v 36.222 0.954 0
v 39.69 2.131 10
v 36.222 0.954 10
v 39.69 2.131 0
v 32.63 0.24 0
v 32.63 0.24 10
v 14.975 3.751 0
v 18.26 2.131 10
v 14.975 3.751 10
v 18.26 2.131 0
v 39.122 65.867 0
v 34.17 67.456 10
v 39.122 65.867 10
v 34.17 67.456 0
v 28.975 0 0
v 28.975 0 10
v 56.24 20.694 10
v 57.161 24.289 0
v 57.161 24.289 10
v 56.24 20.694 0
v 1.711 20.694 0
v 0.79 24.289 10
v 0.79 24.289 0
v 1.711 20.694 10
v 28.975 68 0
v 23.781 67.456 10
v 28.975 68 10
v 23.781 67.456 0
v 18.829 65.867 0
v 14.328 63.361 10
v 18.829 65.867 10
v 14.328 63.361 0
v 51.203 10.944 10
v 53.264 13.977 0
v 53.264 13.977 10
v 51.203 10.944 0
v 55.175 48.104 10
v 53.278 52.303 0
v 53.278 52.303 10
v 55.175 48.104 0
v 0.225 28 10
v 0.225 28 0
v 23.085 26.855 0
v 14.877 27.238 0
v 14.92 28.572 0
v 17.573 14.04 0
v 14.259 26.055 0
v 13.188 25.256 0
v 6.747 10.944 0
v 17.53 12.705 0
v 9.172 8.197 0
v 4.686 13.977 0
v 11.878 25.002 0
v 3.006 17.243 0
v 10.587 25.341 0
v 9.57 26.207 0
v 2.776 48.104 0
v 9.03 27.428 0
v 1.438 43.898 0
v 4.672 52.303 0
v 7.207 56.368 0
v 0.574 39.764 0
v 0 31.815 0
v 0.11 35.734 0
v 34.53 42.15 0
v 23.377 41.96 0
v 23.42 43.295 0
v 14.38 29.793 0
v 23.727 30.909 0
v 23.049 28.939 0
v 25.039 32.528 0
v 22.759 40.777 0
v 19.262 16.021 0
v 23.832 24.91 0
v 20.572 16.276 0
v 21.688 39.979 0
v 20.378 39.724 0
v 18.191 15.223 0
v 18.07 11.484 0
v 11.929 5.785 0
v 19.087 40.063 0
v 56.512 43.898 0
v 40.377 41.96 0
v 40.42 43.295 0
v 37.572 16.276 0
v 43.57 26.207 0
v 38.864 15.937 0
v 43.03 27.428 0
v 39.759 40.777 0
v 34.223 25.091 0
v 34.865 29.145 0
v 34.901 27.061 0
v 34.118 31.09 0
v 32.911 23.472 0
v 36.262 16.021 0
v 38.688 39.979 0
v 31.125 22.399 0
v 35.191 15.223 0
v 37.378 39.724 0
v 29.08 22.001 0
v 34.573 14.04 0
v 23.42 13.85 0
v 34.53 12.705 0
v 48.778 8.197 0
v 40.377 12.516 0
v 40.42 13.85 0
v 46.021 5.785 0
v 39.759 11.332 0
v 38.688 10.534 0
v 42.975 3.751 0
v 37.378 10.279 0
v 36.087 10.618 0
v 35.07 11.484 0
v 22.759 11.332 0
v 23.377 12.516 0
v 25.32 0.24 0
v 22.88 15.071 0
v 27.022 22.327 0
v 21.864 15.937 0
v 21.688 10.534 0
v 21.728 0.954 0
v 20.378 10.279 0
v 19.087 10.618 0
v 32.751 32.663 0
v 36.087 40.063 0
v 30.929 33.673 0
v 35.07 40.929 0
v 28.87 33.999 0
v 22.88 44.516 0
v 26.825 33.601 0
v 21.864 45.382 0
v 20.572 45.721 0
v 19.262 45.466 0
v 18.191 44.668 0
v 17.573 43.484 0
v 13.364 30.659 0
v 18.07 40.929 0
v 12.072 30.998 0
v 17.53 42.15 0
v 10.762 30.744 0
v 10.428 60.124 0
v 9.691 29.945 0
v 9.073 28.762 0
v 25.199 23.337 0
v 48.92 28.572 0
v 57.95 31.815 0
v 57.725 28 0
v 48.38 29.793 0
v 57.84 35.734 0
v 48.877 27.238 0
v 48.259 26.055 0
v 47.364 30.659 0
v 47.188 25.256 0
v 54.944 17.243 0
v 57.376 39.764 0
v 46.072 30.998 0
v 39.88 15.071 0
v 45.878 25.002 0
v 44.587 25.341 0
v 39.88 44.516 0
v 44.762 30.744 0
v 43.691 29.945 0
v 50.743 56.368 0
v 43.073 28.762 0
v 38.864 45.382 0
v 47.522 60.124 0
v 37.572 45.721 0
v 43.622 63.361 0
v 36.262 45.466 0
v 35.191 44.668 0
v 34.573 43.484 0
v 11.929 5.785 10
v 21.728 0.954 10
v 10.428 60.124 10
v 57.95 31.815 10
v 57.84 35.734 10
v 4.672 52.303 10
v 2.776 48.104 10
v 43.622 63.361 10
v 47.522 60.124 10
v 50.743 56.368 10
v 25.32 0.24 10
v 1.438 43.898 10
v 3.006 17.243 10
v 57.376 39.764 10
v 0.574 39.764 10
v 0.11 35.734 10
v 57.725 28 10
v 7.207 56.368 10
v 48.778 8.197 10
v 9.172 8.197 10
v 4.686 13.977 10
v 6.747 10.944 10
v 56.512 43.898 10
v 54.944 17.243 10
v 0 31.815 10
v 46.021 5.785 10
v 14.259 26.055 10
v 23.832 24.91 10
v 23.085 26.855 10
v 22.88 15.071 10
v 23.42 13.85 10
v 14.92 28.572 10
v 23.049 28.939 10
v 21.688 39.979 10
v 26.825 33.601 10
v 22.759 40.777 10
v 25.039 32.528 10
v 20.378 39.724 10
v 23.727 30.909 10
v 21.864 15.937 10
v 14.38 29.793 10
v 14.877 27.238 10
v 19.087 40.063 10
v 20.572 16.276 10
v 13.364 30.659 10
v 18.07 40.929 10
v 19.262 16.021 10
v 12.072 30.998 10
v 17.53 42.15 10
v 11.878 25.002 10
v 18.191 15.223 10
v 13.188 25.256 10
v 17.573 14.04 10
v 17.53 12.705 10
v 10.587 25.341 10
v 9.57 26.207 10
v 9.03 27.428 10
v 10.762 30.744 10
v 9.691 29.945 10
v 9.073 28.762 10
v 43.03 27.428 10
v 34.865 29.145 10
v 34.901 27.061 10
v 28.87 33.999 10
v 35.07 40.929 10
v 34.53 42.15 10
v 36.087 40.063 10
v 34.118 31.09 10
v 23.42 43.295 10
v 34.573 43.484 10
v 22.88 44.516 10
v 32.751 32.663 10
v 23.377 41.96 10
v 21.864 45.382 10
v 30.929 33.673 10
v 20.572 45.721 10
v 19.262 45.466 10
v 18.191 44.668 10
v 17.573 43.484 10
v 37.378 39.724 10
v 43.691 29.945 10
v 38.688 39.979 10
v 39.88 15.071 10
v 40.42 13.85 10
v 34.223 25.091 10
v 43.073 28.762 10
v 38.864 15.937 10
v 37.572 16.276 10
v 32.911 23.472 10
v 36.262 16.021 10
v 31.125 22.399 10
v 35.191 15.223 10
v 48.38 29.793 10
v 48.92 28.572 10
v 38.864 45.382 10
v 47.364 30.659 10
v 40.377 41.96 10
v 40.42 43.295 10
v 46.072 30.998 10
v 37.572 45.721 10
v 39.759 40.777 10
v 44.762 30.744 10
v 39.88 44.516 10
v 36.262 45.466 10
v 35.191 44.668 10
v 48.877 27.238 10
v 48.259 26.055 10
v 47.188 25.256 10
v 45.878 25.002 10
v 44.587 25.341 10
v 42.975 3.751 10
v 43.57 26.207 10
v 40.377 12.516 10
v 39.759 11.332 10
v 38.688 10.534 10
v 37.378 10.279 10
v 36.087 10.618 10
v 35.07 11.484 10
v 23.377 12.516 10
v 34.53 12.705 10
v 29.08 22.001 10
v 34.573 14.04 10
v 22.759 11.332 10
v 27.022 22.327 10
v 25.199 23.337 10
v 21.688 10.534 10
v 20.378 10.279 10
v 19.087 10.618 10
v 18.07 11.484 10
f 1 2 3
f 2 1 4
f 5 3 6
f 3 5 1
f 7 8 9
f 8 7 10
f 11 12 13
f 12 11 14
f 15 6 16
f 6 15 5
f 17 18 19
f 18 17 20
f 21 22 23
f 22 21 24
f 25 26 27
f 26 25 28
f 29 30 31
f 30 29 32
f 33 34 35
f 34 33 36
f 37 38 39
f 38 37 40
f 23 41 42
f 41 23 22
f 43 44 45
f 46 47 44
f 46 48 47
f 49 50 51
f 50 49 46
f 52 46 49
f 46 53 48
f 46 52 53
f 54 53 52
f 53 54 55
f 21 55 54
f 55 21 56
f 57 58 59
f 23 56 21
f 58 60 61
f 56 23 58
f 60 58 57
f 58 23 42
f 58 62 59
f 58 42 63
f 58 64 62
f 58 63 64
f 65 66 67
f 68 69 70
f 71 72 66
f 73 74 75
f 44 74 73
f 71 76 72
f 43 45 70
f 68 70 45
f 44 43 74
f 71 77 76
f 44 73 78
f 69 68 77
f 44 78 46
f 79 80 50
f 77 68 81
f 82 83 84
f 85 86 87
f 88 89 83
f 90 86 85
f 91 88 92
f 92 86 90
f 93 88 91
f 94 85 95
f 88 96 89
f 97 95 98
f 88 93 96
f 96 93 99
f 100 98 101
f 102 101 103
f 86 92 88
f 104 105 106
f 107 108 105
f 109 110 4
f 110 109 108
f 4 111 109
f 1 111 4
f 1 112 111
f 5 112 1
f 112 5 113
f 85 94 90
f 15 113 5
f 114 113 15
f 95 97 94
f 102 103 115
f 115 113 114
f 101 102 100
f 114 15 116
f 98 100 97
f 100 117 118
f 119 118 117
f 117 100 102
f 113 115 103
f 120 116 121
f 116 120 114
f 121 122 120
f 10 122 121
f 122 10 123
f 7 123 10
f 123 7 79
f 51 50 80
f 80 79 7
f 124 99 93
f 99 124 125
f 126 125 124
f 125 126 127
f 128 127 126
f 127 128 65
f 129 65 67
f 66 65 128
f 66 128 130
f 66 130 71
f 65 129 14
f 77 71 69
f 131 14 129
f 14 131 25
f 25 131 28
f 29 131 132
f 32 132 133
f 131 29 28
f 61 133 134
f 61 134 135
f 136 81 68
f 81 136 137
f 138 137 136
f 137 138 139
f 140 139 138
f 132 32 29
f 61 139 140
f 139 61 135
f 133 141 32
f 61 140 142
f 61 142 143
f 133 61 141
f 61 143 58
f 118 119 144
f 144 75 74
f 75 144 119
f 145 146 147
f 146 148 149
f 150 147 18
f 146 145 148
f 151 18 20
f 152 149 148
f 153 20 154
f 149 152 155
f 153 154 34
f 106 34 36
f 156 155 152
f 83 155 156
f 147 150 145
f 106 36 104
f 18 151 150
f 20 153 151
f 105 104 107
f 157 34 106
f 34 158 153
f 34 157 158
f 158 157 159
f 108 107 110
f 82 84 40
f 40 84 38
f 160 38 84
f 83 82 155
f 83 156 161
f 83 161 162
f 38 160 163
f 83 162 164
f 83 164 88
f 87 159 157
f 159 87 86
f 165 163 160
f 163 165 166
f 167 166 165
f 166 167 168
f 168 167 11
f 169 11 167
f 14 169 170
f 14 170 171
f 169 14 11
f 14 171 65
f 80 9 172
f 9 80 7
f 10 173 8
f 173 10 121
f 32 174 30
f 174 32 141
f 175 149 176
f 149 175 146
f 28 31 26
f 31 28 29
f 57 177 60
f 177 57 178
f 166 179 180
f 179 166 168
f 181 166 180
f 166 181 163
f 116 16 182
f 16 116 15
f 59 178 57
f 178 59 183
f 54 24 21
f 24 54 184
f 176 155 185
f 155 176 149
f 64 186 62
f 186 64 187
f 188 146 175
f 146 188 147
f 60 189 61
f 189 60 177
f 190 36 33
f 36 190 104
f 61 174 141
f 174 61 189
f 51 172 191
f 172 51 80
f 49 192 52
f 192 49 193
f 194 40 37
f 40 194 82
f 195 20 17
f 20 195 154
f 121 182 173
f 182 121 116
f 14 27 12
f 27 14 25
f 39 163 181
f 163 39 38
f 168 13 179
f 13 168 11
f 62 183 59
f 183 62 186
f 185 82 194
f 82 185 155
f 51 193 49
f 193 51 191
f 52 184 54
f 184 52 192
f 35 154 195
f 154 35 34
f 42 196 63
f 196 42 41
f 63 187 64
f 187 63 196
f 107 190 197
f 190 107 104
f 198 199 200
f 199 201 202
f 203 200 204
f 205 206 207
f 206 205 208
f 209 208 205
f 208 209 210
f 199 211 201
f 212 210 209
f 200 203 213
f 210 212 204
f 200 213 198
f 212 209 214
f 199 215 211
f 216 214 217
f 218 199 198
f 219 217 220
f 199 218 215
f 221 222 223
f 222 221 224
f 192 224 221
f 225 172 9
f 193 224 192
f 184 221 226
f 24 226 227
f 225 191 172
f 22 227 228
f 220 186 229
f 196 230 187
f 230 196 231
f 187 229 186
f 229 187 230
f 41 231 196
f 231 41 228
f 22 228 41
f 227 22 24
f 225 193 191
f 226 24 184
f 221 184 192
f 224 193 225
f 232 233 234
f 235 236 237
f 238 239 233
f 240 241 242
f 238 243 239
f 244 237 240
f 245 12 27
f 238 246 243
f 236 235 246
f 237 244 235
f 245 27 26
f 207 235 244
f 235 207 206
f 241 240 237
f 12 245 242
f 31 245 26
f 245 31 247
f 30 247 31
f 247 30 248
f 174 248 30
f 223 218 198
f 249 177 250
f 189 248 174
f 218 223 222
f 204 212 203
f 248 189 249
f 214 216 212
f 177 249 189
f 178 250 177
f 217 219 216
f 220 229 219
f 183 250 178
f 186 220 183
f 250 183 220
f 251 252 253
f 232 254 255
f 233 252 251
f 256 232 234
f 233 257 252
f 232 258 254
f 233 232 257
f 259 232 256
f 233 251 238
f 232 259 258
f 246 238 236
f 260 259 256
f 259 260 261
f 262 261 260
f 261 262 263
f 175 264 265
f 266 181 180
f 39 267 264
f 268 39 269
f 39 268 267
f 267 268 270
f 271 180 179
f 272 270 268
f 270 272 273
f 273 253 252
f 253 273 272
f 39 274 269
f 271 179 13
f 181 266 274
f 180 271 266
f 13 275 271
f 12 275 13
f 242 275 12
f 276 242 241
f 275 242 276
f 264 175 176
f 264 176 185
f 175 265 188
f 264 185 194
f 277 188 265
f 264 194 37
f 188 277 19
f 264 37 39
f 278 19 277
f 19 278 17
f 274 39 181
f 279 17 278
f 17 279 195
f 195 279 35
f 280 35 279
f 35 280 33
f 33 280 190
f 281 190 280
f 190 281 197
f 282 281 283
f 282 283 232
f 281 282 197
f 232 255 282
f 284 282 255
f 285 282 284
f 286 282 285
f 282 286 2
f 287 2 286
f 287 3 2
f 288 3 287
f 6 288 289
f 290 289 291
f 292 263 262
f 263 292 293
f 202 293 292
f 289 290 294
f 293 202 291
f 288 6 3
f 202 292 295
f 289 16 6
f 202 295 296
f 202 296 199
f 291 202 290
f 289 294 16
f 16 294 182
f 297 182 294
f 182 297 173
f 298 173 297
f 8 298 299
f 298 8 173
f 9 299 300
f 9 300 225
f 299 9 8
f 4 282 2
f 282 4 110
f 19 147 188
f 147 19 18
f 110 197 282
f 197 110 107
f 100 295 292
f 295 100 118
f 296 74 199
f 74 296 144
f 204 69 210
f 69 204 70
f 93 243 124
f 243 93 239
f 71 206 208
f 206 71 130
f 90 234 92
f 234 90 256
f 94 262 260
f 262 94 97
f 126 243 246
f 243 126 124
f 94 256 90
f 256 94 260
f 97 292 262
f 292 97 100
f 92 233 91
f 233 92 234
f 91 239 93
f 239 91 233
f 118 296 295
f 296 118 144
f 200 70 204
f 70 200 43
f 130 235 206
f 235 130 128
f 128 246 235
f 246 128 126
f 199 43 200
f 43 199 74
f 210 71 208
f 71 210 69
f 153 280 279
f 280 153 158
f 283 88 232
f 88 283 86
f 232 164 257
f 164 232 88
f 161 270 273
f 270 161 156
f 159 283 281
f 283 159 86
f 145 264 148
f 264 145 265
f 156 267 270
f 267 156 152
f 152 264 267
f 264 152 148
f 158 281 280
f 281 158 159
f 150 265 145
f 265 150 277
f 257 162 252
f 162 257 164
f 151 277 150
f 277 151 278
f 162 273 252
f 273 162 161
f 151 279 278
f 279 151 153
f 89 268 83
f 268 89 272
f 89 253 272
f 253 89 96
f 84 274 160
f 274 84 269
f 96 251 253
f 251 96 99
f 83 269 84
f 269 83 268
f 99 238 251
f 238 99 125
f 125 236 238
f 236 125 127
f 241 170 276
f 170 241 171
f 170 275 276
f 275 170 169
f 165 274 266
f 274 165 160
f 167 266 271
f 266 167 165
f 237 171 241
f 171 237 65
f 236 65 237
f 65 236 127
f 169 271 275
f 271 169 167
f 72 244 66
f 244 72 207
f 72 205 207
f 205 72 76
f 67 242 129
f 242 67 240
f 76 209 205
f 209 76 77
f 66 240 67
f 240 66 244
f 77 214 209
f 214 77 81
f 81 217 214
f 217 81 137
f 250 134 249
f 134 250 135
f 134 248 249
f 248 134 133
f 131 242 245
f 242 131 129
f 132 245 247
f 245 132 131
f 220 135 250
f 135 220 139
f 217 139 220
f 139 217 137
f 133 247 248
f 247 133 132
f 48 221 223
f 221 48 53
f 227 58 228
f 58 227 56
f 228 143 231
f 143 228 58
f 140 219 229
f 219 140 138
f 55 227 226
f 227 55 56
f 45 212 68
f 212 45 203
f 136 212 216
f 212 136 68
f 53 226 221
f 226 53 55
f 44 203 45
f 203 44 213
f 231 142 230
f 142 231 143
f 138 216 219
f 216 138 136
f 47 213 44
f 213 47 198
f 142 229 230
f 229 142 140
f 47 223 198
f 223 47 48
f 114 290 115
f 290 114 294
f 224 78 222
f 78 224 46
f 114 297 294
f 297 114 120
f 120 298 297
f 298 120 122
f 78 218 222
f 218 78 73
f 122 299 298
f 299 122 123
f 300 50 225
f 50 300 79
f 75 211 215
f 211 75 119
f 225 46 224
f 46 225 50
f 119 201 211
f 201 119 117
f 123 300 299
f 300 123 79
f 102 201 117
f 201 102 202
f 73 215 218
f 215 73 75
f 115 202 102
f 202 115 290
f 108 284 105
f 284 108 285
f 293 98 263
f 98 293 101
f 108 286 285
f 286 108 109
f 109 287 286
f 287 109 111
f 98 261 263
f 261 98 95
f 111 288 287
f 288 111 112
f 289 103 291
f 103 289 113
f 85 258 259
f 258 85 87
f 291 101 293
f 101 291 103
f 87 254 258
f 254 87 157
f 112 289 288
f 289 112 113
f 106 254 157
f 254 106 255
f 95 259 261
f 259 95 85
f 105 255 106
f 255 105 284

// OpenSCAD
$fn = 32;

// ----------------------------------------------------------------------
// Cam plate: single_lobe cam, base R28
// ----------------------------------------------------------------------

// --- parameters (mm) ---
base_r = 28;              // base circle radius
lobe_h = 12;              // cam lobe rise
bore_r = 6;               // shaft bore radius
plate_t = 10;             // plate thickness, Z (extrusion height)
ring_r = 17;              // lightening ring radius
bolt_r = 3;               // lightening hole radius

profile = [[57.725, 28], [57.95, 31.815], [57.84, 35.734], [57.376, 39.764], [56.512, 43.898], [55.175, 48.104], [53.278, 52.303], [50.743, 56.368], [47.522, 60.124], [43.622, 63.361], [39.122, 65.867], [34.17, 67.456], [28.975, 68], [23.781, 67.456], [18.829, 65.867], [14.328, 63.361], [10.428, 60.124], [7.207, 56.368], [4.672, 52.303], [2.776, 48.104], [1.438, 43.898], [0.574, 39.764], [0.11, 35.734], [0, 31.815], [0.225, 28], [0.79, 24.289], [1.711, 20.694], [3.006, 17.243], [4.686, 13.977], [6.747, 10.944], [9.172, 8.197], [11.929, 5.785], [14.975, 3.751], [18.26, 2.131], [21.728, 0.954], [25.32, 0.24], [28.975, 0], [32.63, 0.24], [36.222, 0.954], [39.69, 2.131], [42.975, 3.751], [46.021, 5.785], [48.778, 8.197], [51.203, 10.944], [53.264, 13.977], [54.944, 17.243], [56.24, 20.694], [57.161, 24.289]];  // primary outline, 48 points, counter clockwise
void_1 = [[34.865, 29.145], [34.118, 31.09], [32.751, 32.663], [30.929, 33.673], [28.87, 33.999], [26.825, 33.601], [25.039, 32.528], [23.727, 30.909], [23.049, 28.939], [23.085, 26.855], [23.832, 24.91], [25.199, 23.337], [27.022, 22.327], [29.08, 22.001], [31.125, 22.399], [32.911, 23.472], [34.223, 25.091], [34.901, 27.061]];  // shaft bore, 18 points
void_2 = [[48.92, 28.572], [48.38, 29.793], [47.364, 30.659], [46.072, 30.998], [44.762, 30.744], [43.691, 29.945], [43.073, 28.762], [43.03, 27.428], [43.57, 26.207], [44.587, 25.341], [45.878, 25.002], [47.188, 25.256], [48.259, 26.055], [48.877, 27.238]];  // lightening hole 1, 14 points
void_3 = [[40.42, 43.295], [39.88, 44.516], [38.864, 45.382], [37.572, 45.721], [36.262, 45.466], [35.191, 44.668], [34.573, 43.484], [34.53, 42.15], [35.07, 40.929], [36.087, 40.063], [37.378, 39.724], [38.688, 39.979], [39.759, 40.777], [40.377, 41.96]];  // lightening hole 2, 14 points
void_4 = [[23.42, 43.295], [22.88, 44.516], [21.864, 45.382], [20.572, 45.721], [19.262, 45.466], [18.191, 44.668], [17.573, 43.484], [17.53, 42.15], [18.07, 40.929], [19.087, 40.063], [20.378, 39.724], [21.688, 39.979], [22.759, 40.777], [23.377, 41.96]];  // lightening hole 3, 14 points
void_5 = [[14.92, 28.572], [14.38, 29.793], [13.364, 30.659], [12.072, 30.998], [10.762, 30.744], [9.691, 29.945], [9.073, 28.762], [9.03, 27.428], [9.57, 26.207], [10.587, 25.341], [11.878, 25.002], [13.188, 25.256], [14.259, 26.055], [14.877, 27.238]];  // lightening hole 4, 14 points
void_6 = [[23.42, 13.85], [22.88, 15.071], [21.864, 15.937], [20.572, 16.276], [19.262, 16.021], [18.191, 15.223], [17.573, 14.04], [17.53, 12.705], [18.07, 11.484], [19.087, 10.618], [20.378, 10.279], [21.688, 10.534], [22.759, 11.332], [23.377, 12.516]];  // lightening hole 5, 14 points
void_7 = [[40.42, 13.85], [39.88, 15.071], [38.864, 15.937], [37.572, 16.276], [36.262, 16.021], [35.191, 15.223], [34.573, 14.04], [34.53, 12.705], [35.07, 11.484], [36.087, 10.618], [37.378, 10.279], [38.688, 10.534], [39.759, 11.332], [40.377, 12.516]];  // lightening hole 6, 14 points

// --- the one profile operation ---
difference() {
  linear_extrude(height = plate_t) polygon(points = profile);
  translate([0, 0, -1])
    linear_extrude(height = plate_t + 2) polygon(points = void_1);
  translate([0, 0, -1])
    linear_extrude(height = plate_t + 2) polygon(points = void_2);
  translate([0, 0, -1])
    linear_extrude(height = plate_t + 2) polygon(points = void_3);
  translate([0, 0, -1])
    linear_extrude(height = plate_t + 2) polygon(points = void_4);
  translate([0, 0, -1])
    linear_extrude(height = plate_t + 2) polygon(points = void_5);
  translate([0, 0, -1])
    linear_extrude(height = plate_t + 2) polygon(points = void_6);
  translate([0, 0, -1])
    linear_extrude(height = plate_t + 2) polygon(points = void_7);
}
